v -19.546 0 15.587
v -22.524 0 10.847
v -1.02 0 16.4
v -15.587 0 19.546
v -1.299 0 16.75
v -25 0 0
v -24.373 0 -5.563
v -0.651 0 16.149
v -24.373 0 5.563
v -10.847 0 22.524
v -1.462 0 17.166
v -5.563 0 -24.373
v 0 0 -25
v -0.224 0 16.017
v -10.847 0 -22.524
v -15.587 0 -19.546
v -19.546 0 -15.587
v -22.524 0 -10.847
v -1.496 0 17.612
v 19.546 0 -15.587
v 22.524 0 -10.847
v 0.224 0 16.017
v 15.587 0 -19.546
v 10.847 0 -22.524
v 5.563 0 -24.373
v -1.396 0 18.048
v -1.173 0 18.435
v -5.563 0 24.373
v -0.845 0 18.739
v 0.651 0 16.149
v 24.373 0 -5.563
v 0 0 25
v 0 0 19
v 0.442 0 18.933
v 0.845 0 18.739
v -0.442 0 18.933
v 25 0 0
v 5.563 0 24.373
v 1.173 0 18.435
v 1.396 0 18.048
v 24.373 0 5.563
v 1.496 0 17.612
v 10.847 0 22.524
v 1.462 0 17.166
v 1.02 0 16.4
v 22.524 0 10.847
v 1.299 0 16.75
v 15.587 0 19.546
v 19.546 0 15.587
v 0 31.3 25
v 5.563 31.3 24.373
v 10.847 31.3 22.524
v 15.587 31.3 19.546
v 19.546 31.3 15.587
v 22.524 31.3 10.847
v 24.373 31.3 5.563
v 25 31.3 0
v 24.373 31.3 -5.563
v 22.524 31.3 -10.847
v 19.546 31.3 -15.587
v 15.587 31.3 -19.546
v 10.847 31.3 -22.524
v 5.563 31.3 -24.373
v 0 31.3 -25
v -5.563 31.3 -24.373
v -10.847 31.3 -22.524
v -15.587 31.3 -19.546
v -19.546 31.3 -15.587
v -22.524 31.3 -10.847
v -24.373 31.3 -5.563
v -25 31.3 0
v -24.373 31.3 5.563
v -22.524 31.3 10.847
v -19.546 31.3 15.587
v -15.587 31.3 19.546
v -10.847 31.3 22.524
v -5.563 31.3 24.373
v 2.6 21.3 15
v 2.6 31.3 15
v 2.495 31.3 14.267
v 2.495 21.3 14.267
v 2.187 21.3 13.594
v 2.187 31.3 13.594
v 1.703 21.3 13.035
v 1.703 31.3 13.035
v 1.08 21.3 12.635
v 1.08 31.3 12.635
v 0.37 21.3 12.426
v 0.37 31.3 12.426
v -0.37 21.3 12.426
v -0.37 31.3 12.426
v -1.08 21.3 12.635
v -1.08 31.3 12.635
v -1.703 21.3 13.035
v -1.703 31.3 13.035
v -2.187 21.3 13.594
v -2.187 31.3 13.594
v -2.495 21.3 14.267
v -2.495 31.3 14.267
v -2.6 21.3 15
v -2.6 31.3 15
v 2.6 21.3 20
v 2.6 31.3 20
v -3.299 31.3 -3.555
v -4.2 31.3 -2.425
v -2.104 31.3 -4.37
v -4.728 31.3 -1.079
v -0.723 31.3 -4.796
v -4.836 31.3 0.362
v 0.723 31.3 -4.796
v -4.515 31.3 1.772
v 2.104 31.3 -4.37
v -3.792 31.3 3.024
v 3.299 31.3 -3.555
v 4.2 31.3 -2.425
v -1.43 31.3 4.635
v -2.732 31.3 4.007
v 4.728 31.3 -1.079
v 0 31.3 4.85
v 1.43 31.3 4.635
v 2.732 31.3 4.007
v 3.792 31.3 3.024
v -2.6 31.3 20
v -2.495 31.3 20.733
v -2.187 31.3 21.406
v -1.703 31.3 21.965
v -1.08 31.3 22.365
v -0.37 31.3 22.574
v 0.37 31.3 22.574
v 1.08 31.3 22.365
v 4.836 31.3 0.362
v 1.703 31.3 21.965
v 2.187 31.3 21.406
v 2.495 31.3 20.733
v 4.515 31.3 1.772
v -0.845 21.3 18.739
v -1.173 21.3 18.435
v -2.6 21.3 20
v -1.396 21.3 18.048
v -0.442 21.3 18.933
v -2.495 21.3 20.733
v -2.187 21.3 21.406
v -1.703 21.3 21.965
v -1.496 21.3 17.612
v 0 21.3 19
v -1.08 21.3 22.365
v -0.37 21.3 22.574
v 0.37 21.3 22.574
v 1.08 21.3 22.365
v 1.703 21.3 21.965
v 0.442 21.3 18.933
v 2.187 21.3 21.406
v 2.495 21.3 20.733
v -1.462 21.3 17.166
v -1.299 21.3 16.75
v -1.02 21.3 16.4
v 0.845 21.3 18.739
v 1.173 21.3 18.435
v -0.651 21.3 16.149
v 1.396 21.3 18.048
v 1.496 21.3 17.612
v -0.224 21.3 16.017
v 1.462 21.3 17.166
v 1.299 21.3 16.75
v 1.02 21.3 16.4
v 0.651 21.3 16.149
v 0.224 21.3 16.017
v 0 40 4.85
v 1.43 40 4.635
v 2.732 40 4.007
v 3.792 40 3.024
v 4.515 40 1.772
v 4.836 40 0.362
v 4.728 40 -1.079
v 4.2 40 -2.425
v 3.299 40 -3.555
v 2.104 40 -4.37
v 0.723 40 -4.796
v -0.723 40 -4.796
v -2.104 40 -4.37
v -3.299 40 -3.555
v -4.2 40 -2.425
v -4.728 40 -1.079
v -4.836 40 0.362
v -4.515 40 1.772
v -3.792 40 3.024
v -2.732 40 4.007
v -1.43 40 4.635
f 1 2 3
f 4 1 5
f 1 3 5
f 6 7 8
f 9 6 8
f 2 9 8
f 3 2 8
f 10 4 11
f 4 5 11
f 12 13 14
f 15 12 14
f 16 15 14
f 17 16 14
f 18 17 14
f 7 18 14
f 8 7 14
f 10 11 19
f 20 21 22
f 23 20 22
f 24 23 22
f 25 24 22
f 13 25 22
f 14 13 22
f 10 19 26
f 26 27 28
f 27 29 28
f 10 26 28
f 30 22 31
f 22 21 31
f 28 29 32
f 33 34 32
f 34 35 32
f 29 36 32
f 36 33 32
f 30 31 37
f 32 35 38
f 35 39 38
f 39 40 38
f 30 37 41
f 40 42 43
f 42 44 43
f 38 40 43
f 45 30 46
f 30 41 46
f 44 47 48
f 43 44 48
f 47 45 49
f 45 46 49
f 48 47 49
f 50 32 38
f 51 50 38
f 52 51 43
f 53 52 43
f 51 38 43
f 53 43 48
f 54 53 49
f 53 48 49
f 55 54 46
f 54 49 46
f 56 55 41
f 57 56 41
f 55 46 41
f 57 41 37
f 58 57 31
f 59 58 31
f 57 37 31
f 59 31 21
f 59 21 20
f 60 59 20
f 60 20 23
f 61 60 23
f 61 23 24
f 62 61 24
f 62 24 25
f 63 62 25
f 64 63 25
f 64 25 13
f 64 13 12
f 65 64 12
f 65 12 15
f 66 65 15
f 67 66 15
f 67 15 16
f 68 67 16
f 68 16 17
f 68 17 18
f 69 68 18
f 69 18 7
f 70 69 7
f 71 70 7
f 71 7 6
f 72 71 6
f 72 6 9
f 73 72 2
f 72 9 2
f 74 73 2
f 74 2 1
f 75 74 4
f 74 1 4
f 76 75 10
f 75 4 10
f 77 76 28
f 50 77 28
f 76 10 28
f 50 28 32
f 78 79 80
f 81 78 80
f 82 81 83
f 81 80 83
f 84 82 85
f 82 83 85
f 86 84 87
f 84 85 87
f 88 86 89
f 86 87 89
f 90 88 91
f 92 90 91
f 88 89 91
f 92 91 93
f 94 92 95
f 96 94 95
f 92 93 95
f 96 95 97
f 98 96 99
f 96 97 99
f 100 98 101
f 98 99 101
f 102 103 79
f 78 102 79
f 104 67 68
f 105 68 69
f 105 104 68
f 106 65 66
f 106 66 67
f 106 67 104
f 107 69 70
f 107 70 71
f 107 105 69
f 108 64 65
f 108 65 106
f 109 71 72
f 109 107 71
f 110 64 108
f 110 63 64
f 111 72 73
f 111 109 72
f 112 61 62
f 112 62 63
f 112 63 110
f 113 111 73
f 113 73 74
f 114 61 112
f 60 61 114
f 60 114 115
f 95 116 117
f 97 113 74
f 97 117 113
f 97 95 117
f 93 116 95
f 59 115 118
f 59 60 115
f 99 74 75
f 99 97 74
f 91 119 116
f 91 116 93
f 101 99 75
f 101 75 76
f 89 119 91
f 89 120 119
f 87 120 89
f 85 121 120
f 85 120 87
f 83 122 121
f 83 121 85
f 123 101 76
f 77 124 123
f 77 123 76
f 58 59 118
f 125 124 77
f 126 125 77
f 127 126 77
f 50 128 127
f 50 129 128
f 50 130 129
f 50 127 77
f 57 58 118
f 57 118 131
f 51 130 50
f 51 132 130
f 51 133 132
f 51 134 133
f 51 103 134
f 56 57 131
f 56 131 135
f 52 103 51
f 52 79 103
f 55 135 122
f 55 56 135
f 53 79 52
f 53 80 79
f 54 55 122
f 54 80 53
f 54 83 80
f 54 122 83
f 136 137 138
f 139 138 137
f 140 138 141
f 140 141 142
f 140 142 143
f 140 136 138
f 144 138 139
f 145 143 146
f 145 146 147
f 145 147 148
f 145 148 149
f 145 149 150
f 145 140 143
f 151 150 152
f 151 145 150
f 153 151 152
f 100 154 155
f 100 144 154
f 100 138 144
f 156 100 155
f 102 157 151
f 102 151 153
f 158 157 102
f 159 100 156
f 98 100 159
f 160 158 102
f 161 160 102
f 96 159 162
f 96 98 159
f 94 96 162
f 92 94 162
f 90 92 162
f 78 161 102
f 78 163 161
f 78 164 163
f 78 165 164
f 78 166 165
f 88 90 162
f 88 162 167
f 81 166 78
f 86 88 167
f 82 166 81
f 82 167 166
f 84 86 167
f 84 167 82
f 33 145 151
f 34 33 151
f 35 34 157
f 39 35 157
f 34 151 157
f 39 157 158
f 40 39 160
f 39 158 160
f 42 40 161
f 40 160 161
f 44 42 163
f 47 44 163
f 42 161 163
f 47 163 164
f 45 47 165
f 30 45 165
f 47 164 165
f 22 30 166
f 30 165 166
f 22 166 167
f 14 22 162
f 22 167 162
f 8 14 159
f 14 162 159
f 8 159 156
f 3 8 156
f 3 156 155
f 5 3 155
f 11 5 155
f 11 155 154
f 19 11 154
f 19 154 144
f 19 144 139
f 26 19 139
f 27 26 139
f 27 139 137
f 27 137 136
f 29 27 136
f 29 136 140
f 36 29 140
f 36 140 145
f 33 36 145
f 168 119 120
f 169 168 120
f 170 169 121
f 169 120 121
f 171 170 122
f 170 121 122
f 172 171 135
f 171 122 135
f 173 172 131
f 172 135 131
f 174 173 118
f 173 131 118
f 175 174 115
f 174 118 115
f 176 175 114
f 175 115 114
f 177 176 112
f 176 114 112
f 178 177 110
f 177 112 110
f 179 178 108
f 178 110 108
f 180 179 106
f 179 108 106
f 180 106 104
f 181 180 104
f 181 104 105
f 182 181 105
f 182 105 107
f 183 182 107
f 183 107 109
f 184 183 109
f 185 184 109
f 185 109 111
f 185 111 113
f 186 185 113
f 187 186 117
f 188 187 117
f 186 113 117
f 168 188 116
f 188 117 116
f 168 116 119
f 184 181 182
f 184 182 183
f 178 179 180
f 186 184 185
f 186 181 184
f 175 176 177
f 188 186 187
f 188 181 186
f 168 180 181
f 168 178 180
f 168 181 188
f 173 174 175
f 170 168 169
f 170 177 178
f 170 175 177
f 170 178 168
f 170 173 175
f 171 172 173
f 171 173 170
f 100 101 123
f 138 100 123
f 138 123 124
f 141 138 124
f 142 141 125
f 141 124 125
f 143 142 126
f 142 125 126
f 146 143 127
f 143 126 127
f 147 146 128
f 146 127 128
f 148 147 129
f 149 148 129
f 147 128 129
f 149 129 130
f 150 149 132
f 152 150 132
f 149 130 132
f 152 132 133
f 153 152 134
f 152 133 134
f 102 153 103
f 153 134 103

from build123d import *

# Parameters (mm, degrees)
SKETCH1_R           = 25
BOSS_EXTRUDE1_DEPTH = 40
CUT_EXTRUDE1_START  = -8.7
SKETCH2_R           = 25
SKETCH2_R_2         = 4.85
CUT_EXTRUDE1_DEPTH  = 8.7
CUT_EXTRUDE2_DEPTH  = 10
SKETCH5_R           = 1.5
CUT_EXTRUDE3_DEPTH  = 42.275779823


with BuildPart() as part:
    # Sketch1 → Boss-Extrude1 (new body)
    with BuildSketch(Plane(origin=(0, 0, 0), x_dir=(1, 0, 0), z_dir=(0, 1, 0))):
        with Locations(Location((0, 0, 0), (0, 0, 270))):
            Circle(SKETCH1_R)
    extrude(amount=BOSS_EXTRUDE1_DEPTH)

    # Sketch2 → Cut-Extrude1 (cut)
    with BuildSketch(Plane(origin=(0, 40, 0), x_dir=(1, 0, 0), z_dir=(0, 1, 0)).offset(CUT_EXTRUDE1_START)):
        with Locations(Location((0, 0, 0), (0, 0, 270))):
            Circle(SKETCH2_R)
        with Locations(Location((0, 0, 0), (0, 0, 270))):
            Circle(SKETCH2_R_2, mode=Mode.SUBTRACT)
    extrude(amount=CUT_EXTRUDE1_DEPTH, mode=Mode.SUBTRACT)

    # Sketch3 → Cut-Extrude2 (cut)
    with BuildSketch(Plane(origin=(0, 31.3, 0), x_dir=(1, 0, 0), z_dir=(0, 1, 0))):
        with BuildLine():
            Line((-2.6, -15), (-2.6, -20))
            ThreePointArc((-2.6, -20), (0, -22.6), (2.6, -20))
            Line((2.6, -20), (2.6, -15))
            ThreePointArc((2.6, -15), (0, -12.4), (-2.6, -15))
        make_face()
    extrude(amount=-CUT_EXTRUDE2_DEPTH, mode=Mode.SUBTRACT)

    # Sketch5 → Cut-Extrude3 (cut, through all)
    with BuildSketch(Plane(origin=(0, 21.3, 0), x_dir=(1, 0, 0), z_dir=(0, 1, 0))):
        with Locations(Location((0, -17.5, 0), (0, 0, 270))):
            Circle(SKETCH5_R)
    extrude(amount=-CUT_EXTRUDE3_DEPTH, mode=Mode.SUBTRACT)


solid = part.part
